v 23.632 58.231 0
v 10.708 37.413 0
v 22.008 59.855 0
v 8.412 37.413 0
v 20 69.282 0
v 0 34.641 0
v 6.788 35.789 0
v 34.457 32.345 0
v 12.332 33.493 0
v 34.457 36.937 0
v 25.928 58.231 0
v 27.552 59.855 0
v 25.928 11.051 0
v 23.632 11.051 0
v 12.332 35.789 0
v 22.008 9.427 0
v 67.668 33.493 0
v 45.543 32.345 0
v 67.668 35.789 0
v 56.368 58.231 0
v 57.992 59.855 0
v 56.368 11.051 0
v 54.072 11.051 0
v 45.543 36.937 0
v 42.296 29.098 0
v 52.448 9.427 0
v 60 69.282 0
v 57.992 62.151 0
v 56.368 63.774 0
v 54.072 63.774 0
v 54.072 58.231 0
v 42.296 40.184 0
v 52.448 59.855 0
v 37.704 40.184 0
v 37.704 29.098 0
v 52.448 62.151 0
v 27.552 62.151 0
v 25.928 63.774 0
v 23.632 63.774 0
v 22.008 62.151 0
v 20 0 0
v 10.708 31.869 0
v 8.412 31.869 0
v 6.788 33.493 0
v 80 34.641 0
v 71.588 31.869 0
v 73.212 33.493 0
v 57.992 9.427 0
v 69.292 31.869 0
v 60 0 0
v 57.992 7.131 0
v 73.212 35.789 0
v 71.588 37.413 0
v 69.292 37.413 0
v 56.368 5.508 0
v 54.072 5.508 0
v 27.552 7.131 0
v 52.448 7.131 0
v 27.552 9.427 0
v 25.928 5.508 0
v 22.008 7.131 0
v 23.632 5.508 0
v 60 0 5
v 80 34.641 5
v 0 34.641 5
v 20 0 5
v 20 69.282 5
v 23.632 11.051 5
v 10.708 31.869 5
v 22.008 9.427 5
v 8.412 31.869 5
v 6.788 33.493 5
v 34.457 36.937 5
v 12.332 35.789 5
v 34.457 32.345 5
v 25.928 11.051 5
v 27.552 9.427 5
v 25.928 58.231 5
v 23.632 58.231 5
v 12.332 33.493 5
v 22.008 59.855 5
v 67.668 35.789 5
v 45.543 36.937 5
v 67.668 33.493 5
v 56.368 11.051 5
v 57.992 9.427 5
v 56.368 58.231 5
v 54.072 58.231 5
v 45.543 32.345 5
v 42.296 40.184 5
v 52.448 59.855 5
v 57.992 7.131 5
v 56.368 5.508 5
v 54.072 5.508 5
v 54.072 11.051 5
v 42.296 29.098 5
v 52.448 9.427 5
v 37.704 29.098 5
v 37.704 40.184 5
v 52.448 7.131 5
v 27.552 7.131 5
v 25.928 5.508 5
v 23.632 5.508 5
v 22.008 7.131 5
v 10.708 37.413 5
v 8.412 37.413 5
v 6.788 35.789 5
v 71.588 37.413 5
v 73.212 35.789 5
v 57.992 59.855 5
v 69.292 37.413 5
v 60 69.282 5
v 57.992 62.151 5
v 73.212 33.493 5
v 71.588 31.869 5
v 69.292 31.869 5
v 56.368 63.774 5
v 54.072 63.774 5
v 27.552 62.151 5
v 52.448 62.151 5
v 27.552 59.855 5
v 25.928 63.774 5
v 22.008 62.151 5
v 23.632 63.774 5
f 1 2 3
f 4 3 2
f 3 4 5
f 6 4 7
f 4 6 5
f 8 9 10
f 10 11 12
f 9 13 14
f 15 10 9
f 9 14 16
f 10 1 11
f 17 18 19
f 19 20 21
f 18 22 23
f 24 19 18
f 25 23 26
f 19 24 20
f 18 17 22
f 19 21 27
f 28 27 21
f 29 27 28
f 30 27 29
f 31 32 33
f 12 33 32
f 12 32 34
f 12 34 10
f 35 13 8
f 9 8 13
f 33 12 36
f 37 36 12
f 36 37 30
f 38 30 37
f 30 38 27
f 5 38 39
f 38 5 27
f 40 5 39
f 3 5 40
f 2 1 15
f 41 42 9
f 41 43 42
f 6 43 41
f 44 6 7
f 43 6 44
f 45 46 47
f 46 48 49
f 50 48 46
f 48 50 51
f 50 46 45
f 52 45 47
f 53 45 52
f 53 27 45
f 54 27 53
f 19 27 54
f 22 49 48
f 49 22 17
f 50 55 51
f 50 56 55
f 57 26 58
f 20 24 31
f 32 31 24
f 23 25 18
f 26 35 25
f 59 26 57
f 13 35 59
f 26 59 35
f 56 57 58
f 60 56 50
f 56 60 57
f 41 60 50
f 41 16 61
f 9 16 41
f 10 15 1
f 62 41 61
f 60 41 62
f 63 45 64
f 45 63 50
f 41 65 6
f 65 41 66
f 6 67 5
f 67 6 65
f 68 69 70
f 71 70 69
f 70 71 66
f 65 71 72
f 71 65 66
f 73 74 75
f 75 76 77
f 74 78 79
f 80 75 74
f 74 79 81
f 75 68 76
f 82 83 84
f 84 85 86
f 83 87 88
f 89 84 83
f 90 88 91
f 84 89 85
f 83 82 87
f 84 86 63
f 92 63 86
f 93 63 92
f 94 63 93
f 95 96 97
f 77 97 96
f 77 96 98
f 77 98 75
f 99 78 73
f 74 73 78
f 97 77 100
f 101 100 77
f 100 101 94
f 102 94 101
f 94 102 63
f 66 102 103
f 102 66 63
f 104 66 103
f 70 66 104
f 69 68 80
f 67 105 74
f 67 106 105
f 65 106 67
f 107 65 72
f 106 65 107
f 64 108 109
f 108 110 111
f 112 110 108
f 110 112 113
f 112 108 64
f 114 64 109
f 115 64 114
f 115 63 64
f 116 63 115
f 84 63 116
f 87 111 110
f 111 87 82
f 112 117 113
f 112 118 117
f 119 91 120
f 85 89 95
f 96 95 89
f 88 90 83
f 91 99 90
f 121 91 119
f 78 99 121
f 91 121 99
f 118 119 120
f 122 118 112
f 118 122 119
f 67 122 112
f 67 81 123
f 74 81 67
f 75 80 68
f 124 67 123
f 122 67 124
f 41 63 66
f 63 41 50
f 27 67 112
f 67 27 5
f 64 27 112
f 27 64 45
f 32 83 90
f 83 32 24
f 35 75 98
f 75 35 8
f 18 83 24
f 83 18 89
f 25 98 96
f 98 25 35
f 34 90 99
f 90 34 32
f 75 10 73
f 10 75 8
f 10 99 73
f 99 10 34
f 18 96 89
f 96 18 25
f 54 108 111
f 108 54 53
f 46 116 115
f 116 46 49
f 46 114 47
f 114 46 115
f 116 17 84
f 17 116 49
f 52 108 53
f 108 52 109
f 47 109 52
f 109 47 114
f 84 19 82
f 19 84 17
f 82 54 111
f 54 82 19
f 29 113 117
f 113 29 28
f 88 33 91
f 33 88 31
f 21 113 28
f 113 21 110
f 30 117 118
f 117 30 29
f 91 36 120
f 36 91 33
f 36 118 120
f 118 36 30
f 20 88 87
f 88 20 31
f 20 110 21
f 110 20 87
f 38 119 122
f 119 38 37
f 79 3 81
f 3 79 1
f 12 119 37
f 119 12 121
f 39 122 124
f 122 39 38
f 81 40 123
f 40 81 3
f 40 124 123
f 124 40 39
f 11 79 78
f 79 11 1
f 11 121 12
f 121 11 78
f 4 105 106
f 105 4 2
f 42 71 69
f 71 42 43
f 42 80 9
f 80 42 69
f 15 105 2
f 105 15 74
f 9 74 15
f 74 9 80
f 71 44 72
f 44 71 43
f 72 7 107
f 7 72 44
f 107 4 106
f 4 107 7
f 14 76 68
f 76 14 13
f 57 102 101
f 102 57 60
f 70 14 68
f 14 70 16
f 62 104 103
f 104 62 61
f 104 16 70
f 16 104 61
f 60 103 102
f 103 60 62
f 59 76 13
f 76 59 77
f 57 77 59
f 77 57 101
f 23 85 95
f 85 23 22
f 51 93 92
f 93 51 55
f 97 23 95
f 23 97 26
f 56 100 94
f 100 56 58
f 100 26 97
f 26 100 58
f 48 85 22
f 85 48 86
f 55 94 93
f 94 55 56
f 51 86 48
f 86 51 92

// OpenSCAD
$fn = 32;

// ----------------------------------------------------------------------
// Polygon plate: 6-gon R40, 6 bolt windows
// ----------------------------------------------------------------------

// --- parameters (mm) ---
sides = 6;                // number of polygon sides
plate_r = 40;             // circumscribed radius of the polygon
bore_r = 6;               // centre bore radius
bolts = 6;                // number of bolt windows
ring_r = 30.44;           // bolt-circle radius
bolt_r = 3;               // bolt window radius
plate_t = 5;              // plate thickness, Z (extrusion height)

plate_d = 2 * plate_r;  // circumscribed diameter
bore_d = 2 * bore_r;  // centre bore diameter
bolt_d = 2 * bolt_r;  // bolt window diameter
ring_d = 2 * ring_r;  // bolt-circle diameter

profile = [[80, 34.641], [60, 69.282], [20, 69.282], [0, 34.641], [20, 0], [60, 0]];  // primary outline, 6 points, counter clockwise
void_1 = [[45.543, 36.937], [42.296, 40.184], [37.704, 40.184], [34.457, 36.937], [34.457, 32.345], [37.704, 29.098], [42.296, 29.098], [45.543, 32.345]];  // centre bore, 8 points
void_2 = [[73.212, 35.789], [71.588, 37.413], [69.292, 37.413], [67.668, 35.789], [67.668, 33.493], [69.292, 31.869], [71.588, 31.869], [73.212, 33.493]];  // bolt window 1, 8 points
void_3 = [[57.992, 62.151], [56.368, 63.774], [54.072, 63.774], [52.448, 62.151], [52.448, 59.855], [54.072, 58.231], [56.368, 58.231], [57.992, 59.855]];  // bolt window 2, 8 points
void_4 = [[27.552, 62.151], [25.928, 63.774], [23.632, 63.774], [22.008, 62.151], [22.008, 59.855], [23.632, 58.231], [25.928, 58.231], [27.552, 59.855]];  // bolt window 3, 8 points
void_5 = [[12.332, 35.789], [10.708, 37.413], [8.412, 37.413], [6.788, 35.789], [6.788, 33.493], [8.412, 31.869], [10.708, 31.869], [12.332, 33.493]];  // bolt window 4, 8 points
void_6 = [[27.552, 9.427], [25.928, 11.051], [23.632, 11.051], [22.008, 9.427], [22.008, 7.131], [23.632, 5.508], [25.928, 5.508], [27.552, 7.131]];  // bolt window 5, 8 points
void_7 = [[57.992, 9.427], [56.368, 11.051], [54.072, 11.051], [52.448, 9.427], [52.448, 7.131], [54.072, 5.508], [56.368, 5.508], [57.992, 7.131]];  // bolt window 6, 8 points

// --- the one profile operation ---
difference() {
  linear_extrude(height = plate_t) polygon(points = profile);
  translate([0, 0, -1])
    linear_extrude(height = plate_t + 2) polygon(points = void_1);
  translate([0, 0, -1])
    linear_extrude(height = plate_t + 2) polygon(points = void_2);
  translate([0, 0, -1])
    linear_extrude(height = plate_t + 2) polygon(points = void_3);
  translate([0, 0, -1])
    linear_extrude(height = plate_t + 2) polygon(points = void_4);
  translate([0, 0, -1])
    linear_extrude(height = plate_t + 2) polygon(points = void_5);
  translate([0, 0, -1])
    linear_extrude(height = plate_t + 2) polygon(points = void_6);
  translate([0, 0, -1])
    linear_extrude(height = plate_t + 2) polygon(points = void_7);
}
